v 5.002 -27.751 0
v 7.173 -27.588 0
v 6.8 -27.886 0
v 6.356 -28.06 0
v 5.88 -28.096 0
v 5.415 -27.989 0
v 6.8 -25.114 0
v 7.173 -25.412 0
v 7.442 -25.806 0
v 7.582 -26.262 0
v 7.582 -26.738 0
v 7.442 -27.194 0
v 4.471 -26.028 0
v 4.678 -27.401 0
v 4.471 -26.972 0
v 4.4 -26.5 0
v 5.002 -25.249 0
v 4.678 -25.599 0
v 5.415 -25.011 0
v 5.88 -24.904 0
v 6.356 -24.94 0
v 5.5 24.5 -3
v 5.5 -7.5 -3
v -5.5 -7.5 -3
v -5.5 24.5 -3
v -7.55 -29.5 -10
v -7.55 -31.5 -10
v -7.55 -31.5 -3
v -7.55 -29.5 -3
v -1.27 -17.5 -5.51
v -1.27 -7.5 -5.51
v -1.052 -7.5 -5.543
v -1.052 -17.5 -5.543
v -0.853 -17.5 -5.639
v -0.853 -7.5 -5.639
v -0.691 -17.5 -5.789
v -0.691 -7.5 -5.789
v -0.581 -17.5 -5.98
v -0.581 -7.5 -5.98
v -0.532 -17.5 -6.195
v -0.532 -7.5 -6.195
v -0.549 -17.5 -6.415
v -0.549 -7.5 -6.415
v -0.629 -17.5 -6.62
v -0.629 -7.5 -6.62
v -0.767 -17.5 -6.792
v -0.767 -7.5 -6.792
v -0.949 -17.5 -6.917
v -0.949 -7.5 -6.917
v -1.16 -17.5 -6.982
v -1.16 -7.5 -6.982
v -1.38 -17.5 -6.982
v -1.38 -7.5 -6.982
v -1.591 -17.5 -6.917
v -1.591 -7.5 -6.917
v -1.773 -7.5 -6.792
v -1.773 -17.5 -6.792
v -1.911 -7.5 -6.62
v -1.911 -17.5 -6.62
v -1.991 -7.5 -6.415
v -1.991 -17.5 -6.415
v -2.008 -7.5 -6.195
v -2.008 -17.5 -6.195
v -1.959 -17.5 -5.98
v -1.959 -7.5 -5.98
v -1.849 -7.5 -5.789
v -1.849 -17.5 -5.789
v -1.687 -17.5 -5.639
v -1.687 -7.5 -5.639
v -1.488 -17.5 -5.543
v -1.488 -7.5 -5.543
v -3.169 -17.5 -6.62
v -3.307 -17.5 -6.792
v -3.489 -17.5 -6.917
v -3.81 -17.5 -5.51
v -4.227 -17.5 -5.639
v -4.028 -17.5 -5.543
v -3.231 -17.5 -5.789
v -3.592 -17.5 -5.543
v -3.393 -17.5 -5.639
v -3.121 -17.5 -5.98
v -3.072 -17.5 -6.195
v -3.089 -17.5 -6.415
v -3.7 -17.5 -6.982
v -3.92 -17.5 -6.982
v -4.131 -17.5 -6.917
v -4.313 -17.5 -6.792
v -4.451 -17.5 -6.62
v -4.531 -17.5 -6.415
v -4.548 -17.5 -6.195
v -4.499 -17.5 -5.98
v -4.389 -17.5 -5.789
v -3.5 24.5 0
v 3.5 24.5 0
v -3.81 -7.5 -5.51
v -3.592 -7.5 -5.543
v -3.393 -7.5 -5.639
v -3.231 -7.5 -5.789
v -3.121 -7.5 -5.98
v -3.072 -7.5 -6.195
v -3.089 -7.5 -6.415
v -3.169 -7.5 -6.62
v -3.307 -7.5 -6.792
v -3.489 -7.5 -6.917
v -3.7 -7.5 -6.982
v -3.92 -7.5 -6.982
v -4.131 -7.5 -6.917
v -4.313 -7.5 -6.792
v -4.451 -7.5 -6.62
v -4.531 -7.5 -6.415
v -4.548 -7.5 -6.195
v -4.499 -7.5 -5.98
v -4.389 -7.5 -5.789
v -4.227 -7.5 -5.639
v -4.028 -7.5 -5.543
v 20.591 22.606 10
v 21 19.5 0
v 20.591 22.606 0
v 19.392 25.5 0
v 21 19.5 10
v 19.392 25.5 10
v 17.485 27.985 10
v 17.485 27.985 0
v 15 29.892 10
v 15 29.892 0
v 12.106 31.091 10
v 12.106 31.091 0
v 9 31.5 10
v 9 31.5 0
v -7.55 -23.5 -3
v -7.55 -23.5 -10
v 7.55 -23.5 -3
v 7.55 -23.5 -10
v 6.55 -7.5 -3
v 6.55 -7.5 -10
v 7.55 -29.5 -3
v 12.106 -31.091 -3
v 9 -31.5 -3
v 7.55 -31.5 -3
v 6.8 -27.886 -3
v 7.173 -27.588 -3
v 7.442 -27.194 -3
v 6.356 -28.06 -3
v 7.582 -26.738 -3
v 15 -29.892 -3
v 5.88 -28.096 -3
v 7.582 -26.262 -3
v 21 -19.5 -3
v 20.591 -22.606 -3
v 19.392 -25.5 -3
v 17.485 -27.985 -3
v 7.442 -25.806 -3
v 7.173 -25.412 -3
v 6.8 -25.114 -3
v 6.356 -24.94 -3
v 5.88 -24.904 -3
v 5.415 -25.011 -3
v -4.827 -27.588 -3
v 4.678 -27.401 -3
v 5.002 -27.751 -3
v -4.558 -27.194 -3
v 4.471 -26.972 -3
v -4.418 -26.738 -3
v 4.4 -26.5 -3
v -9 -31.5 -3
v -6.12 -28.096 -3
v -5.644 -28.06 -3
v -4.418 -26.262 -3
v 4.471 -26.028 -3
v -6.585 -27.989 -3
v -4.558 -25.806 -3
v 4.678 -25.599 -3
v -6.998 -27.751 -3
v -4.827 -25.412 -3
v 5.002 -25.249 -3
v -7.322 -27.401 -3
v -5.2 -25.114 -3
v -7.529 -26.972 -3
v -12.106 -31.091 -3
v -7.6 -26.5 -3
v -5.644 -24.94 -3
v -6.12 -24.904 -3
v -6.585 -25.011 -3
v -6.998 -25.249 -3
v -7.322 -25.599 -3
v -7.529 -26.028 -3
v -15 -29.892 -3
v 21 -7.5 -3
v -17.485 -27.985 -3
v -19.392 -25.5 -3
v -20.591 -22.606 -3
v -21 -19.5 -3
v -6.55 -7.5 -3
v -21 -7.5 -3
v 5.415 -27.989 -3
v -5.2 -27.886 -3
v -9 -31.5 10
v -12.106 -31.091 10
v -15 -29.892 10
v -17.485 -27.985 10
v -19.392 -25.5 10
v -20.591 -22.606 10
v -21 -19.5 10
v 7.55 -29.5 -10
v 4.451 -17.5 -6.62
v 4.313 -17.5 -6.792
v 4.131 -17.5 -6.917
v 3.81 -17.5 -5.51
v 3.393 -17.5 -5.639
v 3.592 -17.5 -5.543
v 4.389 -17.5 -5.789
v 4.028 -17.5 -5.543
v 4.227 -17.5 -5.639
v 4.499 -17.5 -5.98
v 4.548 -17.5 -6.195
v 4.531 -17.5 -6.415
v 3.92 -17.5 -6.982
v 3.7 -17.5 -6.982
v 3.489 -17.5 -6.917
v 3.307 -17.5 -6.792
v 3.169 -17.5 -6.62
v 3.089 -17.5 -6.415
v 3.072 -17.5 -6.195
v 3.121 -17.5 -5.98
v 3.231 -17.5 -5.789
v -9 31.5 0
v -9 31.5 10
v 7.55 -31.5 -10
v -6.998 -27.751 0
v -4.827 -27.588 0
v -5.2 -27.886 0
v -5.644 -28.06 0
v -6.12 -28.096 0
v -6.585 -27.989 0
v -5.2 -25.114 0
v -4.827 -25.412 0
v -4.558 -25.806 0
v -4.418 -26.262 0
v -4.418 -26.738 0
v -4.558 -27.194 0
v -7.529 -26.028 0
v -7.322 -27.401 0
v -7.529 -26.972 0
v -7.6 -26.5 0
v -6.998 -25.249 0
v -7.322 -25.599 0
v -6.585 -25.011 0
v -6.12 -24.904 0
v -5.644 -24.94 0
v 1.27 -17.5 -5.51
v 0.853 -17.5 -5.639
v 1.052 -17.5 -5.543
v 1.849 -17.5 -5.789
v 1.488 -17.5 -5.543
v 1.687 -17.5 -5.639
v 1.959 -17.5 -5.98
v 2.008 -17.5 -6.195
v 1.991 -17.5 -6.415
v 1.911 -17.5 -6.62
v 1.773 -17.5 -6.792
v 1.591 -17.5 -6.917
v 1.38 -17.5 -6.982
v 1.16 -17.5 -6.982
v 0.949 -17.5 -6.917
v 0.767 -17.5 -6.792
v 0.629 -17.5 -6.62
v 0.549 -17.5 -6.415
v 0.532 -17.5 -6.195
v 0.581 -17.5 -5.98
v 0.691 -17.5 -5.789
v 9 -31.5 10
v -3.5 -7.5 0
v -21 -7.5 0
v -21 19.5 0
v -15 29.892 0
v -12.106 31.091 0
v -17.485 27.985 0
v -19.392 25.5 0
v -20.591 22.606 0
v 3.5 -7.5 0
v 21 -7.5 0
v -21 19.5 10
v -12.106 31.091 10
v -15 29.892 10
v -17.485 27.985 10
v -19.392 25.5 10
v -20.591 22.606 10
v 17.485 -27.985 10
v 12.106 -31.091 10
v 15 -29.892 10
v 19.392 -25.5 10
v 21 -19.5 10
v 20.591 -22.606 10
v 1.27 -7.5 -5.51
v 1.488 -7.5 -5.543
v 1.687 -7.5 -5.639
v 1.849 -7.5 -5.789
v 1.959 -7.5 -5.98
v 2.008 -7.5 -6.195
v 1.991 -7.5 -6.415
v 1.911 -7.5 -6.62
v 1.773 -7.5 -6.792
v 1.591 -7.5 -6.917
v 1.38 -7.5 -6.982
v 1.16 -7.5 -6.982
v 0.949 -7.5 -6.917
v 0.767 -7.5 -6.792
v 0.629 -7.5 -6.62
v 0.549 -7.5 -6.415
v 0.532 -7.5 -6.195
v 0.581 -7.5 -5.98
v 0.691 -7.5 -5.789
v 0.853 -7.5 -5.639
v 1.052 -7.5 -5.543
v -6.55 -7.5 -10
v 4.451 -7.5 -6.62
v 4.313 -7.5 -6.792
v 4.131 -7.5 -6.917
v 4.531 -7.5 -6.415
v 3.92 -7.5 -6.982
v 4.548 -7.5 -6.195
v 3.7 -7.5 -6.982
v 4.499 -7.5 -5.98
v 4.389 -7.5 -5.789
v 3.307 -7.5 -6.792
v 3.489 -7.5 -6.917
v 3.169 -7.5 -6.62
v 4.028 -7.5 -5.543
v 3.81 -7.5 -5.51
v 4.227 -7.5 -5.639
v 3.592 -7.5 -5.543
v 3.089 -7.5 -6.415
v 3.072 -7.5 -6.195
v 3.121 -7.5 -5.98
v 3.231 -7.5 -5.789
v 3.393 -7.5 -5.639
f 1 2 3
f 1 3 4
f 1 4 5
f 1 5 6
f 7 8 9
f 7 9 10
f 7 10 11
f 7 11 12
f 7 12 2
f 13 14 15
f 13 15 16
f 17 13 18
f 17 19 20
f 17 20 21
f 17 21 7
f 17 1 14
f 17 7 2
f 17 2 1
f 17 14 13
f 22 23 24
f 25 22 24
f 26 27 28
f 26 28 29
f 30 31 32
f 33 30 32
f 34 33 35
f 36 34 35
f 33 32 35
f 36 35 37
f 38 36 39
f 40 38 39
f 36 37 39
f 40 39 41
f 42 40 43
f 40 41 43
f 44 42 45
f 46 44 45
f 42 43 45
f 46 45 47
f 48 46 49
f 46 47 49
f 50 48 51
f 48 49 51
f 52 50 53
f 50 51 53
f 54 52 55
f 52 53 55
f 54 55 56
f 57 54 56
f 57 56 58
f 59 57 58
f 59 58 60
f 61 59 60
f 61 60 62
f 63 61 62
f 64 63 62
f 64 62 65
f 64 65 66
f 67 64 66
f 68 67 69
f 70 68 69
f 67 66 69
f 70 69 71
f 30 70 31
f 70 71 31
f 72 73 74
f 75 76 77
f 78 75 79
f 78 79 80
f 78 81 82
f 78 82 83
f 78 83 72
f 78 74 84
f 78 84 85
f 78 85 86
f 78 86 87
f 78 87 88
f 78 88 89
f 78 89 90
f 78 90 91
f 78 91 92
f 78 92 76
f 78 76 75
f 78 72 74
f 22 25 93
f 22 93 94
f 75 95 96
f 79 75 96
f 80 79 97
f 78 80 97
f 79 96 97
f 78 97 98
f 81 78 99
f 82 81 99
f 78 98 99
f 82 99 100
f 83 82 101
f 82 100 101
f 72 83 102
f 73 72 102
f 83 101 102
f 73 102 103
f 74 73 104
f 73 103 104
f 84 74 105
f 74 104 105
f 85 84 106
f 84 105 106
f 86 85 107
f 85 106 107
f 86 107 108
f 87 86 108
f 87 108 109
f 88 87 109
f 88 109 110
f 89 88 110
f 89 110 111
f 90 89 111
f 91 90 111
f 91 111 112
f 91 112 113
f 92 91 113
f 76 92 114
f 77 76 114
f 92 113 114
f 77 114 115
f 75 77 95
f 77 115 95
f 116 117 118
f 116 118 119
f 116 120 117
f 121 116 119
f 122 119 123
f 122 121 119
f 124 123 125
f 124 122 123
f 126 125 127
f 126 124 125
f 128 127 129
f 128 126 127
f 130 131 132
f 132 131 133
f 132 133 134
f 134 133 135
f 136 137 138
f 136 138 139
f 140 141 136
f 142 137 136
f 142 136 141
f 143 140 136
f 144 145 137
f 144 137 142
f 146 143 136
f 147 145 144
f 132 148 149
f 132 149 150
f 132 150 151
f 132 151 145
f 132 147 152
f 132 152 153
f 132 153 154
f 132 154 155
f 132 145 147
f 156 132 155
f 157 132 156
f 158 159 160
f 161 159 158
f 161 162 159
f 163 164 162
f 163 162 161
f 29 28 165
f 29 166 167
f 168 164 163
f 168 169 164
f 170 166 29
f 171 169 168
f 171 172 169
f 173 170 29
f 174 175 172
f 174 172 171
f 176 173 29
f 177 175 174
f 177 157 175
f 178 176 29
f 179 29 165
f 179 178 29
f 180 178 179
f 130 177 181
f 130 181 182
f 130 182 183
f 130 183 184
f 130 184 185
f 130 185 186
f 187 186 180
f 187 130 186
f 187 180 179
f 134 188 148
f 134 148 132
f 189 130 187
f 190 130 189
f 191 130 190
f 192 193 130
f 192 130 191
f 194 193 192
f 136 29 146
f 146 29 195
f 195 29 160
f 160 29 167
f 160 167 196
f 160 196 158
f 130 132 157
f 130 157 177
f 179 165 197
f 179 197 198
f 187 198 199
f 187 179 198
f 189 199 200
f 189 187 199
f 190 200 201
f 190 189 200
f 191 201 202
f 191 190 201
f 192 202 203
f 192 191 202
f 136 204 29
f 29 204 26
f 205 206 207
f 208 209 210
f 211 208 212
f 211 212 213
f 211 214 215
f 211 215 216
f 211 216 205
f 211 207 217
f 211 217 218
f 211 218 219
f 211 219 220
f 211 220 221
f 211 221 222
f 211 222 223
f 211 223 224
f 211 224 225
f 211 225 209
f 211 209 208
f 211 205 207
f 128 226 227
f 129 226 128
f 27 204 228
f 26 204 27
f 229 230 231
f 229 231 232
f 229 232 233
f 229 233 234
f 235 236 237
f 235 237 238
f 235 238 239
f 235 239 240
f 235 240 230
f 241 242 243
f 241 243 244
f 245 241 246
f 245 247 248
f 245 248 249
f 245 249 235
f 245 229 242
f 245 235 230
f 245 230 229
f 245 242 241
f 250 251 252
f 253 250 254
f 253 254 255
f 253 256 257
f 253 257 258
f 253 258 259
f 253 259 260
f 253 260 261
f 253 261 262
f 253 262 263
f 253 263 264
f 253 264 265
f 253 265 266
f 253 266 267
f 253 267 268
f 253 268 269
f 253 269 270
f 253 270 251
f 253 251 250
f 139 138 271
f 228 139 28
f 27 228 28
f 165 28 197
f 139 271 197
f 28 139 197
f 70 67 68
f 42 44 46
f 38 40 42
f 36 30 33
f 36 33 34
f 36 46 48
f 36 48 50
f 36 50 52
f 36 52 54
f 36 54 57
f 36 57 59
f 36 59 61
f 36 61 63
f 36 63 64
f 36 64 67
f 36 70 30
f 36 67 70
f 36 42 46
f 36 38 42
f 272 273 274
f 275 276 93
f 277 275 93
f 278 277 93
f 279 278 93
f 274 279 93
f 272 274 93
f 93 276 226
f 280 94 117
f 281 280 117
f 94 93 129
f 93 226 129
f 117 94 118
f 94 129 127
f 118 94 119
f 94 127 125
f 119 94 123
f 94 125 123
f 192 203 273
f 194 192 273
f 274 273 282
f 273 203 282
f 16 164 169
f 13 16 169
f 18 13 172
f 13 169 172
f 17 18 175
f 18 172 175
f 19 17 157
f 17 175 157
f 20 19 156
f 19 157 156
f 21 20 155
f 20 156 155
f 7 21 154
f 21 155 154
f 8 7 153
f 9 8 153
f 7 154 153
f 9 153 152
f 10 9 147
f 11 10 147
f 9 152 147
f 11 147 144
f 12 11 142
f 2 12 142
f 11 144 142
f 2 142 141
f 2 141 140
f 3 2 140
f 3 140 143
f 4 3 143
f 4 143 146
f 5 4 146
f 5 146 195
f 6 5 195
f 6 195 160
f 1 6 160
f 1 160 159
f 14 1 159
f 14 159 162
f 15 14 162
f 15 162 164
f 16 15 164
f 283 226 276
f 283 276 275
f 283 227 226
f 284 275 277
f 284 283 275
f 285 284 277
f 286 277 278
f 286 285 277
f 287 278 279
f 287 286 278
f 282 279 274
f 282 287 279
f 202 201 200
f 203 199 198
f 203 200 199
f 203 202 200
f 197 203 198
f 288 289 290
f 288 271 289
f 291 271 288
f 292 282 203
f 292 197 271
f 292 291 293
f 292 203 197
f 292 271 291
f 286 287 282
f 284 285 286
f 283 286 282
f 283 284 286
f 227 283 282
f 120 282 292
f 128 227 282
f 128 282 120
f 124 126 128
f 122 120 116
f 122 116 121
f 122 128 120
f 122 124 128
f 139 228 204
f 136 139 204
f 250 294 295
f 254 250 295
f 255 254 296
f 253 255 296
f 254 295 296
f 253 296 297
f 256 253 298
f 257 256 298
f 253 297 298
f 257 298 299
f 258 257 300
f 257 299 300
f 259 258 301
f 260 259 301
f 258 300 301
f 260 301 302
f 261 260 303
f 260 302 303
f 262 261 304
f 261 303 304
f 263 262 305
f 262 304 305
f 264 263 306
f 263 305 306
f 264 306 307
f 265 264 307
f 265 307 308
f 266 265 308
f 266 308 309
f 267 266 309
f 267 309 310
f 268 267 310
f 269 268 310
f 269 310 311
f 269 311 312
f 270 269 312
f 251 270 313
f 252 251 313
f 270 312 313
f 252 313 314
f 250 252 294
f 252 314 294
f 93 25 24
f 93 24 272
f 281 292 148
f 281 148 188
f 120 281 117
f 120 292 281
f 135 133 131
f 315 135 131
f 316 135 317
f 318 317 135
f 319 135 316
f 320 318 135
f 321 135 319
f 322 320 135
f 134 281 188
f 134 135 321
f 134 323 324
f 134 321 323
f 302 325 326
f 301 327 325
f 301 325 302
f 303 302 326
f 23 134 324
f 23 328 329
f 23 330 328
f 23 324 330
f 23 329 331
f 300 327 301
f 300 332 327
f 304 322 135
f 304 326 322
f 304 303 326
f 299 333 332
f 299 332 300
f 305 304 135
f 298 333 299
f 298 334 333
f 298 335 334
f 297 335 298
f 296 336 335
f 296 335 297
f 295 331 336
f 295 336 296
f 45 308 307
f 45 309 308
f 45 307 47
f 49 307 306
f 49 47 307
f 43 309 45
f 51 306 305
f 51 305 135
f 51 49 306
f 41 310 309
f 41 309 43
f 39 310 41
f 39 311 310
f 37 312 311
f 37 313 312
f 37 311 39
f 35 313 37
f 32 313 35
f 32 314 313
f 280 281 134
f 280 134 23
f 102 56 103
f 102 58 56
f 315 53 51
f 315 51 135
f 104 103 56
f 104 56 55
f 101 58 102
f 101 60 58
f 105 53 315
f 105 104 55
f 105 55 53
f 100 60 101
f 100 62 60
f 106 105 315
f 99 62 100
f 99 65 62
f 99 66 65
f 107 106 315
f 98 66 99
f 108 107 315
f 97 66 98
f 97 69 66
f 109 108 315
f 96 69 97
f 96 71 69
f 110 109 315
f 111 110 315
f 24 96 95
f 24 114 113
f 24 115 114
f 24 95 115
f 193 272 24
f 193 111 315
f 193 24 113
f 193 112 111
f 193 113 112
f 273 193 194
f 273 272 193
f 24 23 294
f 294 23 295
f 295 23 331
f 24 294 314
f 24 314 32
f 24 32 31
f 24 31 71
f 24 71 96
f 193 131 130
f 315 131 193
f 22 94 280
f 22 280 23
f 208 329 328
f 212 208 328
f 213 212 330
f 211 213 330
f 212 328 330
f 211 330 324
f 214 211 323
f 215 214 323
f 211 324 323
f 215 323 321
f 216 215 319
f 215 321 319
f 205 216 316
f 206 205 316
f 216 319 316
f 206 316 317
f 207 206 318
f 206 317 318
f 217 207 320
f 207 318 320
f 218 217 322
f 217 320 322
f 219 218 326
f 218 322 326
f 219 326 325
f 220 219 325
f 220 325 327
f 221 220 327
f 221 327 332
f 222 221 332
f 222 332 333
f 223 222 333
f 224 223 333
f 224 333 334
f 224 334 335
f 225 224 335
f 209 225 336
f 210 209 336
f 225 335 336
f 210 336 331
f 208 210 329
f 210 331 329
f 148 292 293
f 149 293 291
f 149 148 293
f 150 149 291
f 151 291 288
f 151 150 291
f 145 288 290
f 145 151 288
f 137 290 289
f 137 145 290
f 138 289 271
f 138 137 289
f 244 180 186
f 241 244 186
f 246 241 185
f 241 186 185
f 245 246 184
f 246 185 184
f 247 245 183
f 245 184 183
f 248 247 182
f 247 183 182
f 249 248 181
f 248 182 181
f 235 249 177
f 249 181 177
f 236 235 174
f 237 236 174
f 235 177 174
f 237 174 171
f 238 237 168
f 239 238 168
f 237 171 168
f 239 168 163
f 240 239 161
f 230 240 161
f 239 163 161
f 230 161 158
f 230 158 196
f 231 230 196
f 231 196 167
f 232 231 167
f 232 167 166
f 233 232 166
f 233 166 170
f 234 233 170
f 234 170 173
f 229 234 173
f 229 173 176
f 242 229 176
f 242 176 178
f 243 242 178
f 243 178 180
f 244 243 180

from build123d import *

# Parameters (mm, degrees)
SKETCH_2_W           = 42
SKETCH_2_H           = 63
EXTRUDE_1_DEPTH      = 10
SKETCH_3_W           = 42
SKETCH_3_H           = 24
EXTRUDE_2_DEPTH      = 10
EXTRUDE_3_DEPTH      = 32
SKETCH_5_R           = 0.74
CUT_EXTRUDE_1_DEPTH  = 10
CUT_EXTRUDE_2_DEPTH  = 7
SKETCH_8_R           = 1.6
CUT_EXTRUDE_4_DEPTH  = 3
FILLET_6_R           = 12
CUT_EXTRUDE_21_DEPTH = 7


with BuildPart() as part:
    # 草图2 → 凸台-拉伸1 (new body)
    with BuildSketch(Plane.XY):
        Rectangle(SKETCH_2_W, SKETCH_2_H)
    extrude(amount=EXTRUDE_1_DEPTH)

    # 草图3 → 凸台-拉伸2 (add)
    with BuildSketch(Plane(origin=(0, 0, 0), x_dir=(-1, 0, 0), z_dir=(0, 0, -1))):
        with Locations((0, -19.5)):
            Rectangle(SKETCH_3_W, SKETCH_3_H)
    extrude(amount=EXTRUDE_2_DEPTH)

    # 草图4 → 凸台-拉伸3 (add)
    with BuildSketch(Plane(origin=(0, -7.5, 0), x_dir=(1, 0, 0), z_dir=(0, 1, 0))):
        Polygon((3.5, 0), (5.5, 3), (-5.5, 3), (-3.5, 0), align=None)
    extrude(amount=EXTRUDE_3_DEPTH)

    # 草图5 → 切除-拉伸1 (cut)
    with BuildSketch(Plane(origin=(0, -7.5, 0), x_dir=(1, 0, 0), z_dir=(0, 1, 0))):
        with Locations((-3.81, 6.25)):
            Circle(SKETCH_5_R)
        with Locations((-1.27, 6.25)):
            Circle(SKETCH_5_R)
        with Locations((3.81, 6.25)):
            Circle(SKETCH_5_R)
        with Locations((1.27, 6.25)):
            Circle(SKETCH_5_R)
    extrude(amount=-CUT_EXTRUDE_1_DEPTH, mode=Mode.SUBTRACT)

    # 草图6 → 切除-拉伸2 (cut)
    with BuildSketch(Plane(origin=(0, 0, -10), x_dir=(-1, 0, 0), z_dir=(0, 0, -1))):
        with BuildLine():
            Line((-9.55, -19.5), (-9.55, -7.5))
            Line((-9.55, -7.5), (-21, -7.5))
            Line((-21, -7.5), (-21, -17.5))
            Line((-21, -17.5), (-19, -17.5))
            Line((-19, -17.5), (-19, -21.5))
            ThreePointArc((-19, -21.5), (-16.656854249, -27.156854249), (-11, -29.5))
            Line((-11, -29.5), (11, -29.5))
            ThreePointArc((11, -29.5), (16.656854249, -27.156854249), (19, -21.5))
            Line((19, -21.5), (19, -17.5))
            Line((19, -17.5), (21, -17.5))
            Line((21, -17.5), (21, -7.5))
            Line((21, -7.5), (9.55, -7.5))
            Line((9.55, -7.5), (9.55, -19.5))
            ThreePointArc((9.55, -19.5), (12.378427125, -20.671572875), (13.55, -23.5))
            ThreePointArc((13.55, -23.5), (11.55, -25.5), (9.55, -23.5))
            Line((9.55, -23.5), (-9.55, -23.5))
            ThreePointArc((-9.55, -23.5), (-11.55, -25.5), (-13.55, -23.5))
            ThreePointArc((-13.55, -23.5), (-12.378427125, -20.671572875), (-9.55, -19.5))
        make_face()
    extrude(amount=-CUT_EXTRUDE_2_DEPTH, mode=Mode.SUBTRACT)

    # 草图8 → 切除-拉伸4 (cut)
    with BuildSketch(Plane(origin=(0, 0, -3), x_dir=(-1, 0, 0), z_dir=(0, 0, -1))):
        with Locations((6, -26.5)):
            Circle(SKETCH_8_R)
        with Locations((-6, -26.5)):
            Circle(SKETCH_8_R)
    extrude(amount=-CUT_EXTRUDE_4_DEPTH, mode=Mode.SUBTRACT)

    # 圆角6
    fillet_6_edges = [part.edges().sort_by_distance(p)[0] for p in [
        (21, -31.5, 0),
        (-21, -31.5, 0),
        (-21, 31.5, 5),
        (21, 31.5, 5),
    ]]
    fillet(fillet_6_edges, radius=FILLET_6_R)

    # 草图43 → 切除-拉伸21 (cut)
    with BuildSketch(Plane(origin=(0, 0, -10), x_dir=(-1, 0, 0), z_dir=(0, 0, -1))):
        Polygon((6.55, -7.5), (7.55, -23.5), (7.55, -31.5), (21, -31.5), (21, -7.5), align=None)
        Polygon((-7.55, -31.5), (-7.55, -23.5), (-6.55, -7.5), (-21, -7.5), (-21, -31.5), align=None)
    extrude(amount=-CUT_EXTRUDE_21_DEPTH, mode=Mode.SUBTRACT)


solid = part.part
